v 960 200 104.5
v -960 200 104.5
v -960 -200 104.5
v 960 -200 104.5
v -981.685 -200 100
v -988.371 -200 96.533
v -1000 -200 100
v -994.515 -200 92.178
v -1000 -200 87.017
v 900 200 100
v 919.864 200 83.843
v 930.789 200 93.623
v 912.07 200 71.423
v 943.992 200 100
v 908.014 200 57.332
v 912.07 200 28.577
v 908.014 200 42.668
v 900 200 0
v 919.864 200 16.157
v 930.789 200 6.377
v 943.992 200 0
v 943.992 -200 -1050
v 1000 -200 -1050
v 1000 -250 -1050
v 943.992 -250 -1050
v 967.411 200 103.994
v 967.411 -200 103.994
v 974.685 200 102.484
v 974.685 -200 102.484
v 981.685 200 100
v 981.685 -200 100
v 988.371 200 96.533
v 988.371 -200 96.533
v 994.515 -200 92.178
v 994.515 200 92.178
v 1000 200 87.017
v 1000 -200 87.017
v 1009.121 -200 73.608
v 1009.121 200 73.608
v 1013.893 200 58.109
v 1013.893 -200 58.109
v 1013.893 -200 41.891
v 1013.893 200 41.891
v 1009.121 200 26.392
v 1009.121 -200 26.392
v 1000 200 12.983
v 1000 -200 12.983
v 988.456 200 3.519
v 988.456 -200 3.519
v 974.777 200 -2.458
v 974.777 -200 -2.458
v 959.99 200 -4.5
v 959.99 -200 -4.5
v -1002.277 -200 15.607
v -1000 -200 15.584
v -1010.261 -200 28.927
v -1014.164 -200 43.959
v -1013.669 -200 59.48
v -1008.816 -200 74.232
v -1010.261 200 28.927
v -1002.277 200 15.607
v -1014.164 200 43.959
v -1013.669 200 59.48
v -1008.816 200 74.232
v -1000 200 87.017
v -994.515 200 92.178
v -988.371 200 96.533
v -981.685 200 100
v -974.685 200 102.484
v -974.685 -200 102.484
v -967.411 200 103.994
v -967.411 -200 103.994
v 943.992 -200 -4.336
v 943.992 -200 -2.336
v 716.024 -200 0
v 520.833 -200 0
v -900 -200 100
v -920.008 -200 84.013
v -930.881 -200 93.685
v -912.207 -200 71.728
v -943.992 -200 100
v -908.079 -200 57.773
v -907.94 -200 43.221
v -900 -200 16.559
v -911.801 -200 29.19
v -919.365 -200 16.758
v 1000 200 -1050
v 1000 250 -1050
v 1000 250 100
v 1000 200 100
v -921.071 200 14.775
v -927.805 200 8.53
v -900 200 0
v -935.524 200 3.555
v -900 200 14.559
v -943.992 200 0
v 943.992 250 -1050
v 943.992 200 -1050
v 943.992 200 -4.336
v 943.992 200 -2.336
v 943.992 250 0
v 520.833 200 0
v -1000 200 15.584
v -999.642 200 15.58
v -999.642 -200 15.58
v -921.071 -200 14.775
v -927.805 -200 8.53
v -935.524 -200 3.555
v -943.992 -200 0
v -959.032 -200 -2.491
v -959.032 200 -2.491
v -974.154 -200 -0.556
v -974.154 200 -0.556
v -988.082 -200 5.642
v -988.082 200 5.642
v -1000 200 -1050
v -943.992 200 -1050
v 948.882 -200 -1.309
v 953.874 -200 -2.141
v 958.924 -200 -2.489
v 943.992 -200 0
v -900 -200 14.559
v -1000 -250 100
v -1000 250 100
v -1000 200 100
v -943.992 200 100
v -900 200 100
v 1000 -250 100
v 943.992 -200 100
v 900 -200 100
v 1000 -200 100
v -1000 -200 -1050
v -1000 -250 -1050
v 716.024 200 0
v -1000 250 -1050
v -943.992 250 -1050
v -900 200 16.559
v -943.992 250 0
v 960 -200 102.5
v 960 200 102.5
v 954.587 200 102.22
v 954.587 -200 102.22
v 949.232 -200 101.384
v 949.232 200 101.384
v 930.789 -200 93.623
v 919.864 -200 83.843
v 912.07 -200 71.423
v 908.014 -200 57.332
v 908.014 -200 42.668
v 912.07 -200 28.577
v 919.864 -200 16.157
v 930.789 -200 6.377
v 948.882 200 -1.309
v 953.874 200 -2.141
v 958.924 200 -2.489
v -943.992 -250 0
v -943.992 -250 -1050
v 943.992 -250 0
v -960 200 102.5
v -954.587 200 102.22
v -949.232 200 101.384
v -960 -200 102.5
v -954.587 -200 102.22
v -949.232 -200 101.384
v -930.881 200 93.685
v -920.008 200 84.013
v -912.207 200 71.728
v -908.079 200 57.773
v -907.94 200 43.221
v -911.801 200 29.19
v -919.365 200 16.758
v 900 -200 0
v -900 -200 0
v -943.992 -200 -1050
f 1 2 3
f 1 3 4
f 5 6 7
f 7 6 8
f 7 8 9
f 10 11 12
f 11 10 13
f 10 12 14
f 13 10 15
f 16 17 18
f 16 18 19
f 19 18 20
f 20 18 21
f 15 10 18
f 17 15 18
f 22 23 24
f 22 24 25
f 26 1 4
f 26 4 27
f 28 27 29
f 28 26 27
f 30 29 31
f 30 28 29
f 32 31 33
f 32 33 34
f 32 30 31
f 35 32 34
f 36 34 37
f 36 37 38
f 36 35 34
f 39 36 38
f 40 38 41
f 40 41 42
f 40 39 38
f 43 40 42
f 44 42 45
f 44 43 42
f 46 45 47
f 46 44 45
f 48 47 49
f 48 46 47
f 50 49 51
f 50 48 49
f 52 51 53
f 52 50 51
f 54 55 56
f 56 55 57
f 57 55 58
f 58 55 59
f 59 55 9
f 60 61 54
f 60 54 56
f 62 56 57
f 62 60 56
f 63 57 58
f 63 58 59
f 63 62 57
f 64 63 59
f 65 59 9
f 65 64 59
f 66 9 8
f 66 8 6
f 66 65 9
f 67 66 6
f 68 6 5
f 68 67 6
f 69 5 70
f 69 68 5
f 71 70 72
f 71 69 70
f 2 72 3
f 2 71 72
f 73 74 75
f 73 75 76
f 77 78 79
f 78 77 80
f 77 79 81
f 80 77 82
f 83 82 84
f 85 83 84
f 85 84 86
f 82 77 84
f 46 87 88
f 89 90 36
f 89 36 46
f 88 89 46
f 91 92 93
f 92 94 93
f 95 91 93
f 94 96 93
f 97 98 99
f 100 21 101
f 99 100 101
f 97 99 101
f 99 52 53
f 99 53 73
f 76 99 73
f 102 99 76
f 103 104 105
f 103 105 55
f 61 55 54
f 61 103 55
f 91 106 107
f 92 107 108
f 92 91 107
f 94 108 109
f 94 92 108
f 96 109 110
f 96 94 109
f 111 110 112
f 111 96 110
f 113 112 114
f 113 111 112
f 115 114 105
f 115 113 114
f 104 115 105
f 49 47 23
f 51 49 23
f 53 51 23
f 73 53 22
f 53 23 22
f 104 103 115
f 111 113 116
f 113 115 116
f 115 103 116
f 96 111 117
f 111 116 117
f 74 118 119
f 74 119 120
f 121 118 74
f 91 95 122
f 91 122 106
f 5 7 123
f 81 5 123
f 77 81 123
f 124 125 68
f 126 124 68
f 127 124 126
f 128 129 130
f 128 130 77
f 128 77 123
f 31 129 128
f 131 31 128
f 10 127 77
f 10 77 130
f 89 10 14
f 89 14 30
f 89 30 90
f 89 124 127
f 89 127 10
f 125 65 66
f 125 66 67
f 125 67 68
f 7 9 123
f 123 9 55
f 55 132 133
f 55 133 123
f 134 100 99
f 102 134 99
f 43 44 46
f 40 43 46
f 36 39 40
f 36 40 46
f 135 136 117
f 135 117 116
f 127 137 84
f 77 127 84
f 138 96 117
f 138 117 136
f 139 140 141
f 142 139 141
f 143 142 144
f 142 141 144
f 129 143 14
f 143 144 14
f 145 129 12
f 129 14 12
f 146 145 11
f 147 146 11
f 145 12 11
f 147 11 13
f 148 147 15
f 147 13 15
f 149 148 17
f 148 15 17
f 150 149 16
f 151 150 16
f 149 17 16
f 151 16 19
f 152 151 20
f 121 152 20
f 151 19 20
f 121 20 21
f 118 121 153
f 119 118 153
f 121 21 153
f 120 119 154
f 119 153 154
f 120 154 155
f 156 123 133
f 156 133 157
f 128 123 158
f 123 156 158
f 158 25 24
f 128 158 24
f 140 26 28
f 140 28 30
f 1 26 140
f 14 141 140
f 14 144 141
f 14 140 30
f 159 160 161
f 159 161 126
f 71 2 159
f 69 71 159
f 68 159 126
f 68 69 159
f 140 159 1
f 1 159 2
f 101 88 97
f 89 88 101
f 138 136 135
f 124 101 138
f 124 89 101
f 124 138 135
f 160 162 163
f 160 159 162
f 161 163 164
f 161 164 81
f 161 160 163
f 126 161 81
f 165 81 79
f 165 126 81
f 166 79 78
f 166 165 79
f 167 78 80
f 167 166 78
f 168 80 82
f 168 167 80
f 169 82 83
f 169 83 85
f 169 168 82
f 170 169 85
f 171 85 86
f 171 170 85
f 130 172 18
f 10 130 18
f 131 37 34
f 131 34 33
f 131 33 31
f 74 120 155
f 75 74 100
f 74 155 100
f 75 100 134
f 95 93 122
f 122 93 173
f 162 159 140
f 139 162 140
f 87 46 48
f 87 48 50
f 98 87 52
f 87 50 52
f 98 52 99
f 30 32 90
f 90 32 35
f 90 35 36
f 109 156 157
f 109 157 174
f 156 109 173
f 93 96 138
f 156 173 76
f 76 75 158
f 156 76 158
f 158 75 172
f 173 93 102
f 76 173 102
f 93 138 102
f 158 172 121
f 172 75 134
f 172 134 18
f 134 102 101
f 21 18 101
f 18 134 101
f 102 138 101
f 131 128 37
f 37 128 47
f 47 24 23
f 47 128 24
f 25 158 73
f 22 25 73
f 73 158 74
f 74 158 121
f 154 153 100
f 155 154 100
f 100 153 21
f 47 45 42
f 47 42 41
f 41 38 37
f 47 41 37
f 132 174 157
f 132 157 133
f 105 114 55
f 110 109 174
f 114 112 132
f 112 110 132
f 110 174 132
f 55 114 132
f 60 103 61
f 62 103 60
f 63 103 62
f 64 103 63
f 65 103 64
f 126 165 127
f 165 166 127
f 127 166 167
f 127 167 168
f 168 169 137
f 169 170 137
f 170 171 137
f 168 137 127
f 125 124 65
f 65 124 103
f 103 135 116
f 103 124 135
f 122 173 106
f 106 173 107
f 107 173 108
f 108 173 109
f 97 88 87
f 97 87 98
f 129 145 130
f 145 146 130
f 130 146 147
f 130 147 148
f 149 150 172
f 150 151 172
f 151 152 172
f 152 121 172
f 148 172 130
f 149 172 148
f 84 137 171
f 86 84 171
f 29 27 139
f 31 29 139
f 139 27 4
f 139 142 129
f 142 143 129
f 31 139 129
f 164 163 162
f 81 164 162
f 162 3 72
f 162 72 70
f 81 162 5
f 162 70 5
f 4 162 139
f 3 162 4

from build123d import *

# Parameters (mm, degrees)
BOSS_EXTRUDE1_DEPTH = 100
SKETCH2_R           = 52.5
BOSS_EXTRUDE2_DEPTH = 400
BOSS_EXTRUDE3_START = -400
BOSS_EXTRUDE3_DEPTH = 400
SKETCH4_W           = 56.007810594
SKETCH4_H           = 50
BOSS_EXTRUDE4_DEPTH = 1050


with BuildPart() as part:
    # Sketch1 → Boss-Extrude1 (new body)
    with BuildSketch(Plane.XY):
        Polygon((-1000, 200), (-900, 200), (-900, -200), (-1000, -200), (-1000, -250), (1000, -250), (1000, -200), (900, -200), (900, 200), (1000, 200), (1000, 250), (-1000, 250), align=None)
    extrude(amount=BOSS_EXTRUDE1_DEPTH)

    # Sketch2 → Boss-Extrude2 (add)
    with BuildSketch(Plane.XZ.offset(-200)):
        with Locations(Location((960, 50, 0), (0, 0, 107.752790162))):
            Circle(SKETCH2_R)
    boss_extrude2 = extrude(amount=BOSS_EXTRUDE2_DEPTH)

    # Mirror1: Boss-Extrude2 across plane
    add(boss_extrude2.mirror(Plane(origin=(0, 0, 0), x_dir=(0, 0, 1), z_dir=(1, 0, 0))))

    # Sketch3 → Boss-Extrude3 (add)
    with BuildSketch(Plane.XZ.offset(200).offset(BOSS_EXTRUDE3_START)):
        with BuildLine():
            Line((959.98965758, -4.499999019), (-1002.277476215, 15.607195449))
            ThreePointArc((-1002.277476215, 15.607195449), (-1009.217160869, 73.407714027), (-960, 104.5))
            Line((-960, 104.5), (960, 104.5))
            ThreePointArc((960, 104.5), (1014.499999755, 49.99482879), (959.98965758, -4.499999019))
        make_face()
        with BuildLine():
            Line((-960, 102.5), (960, 102.5))
            ThreePointArc((960, 102.5), (1012.5, 50), (960, -2.5))
            Line((960, -2.5), (-1001.307615203, 17.597362357))
            ThreePointArc((-1001.307615203, 17.597362357), (-1007.209048265, 72.96858206), (-960, 102.5))
        make_face(mode=Mode.SUBTRACT)
    extrude(amount=BOSS_EXTRUDE3_DEPTH)

    # Sketch4 → Boss-Extrude4 (add)
    with BuildSketch(Plane(origin=(0, 0, 0), x_dir=(-1, 0, 0), z_dir=(0, 0, -1))):
        with Locations((-971.996094703, 225)):
            Rectangle(SKETCH4_W, SKETCH4_H)
        with Locations((971.996094703, 225)):
            Rectangle(SKETCH4_W, SKETCH4_H)
        with Locations((971.996094703, -225)):
            Rectangle(SKETCH4_W, SKETCH4_H)
        with Locations((-971.996094703, -225)):
            Rectangle(SKETCH4_W, SKETCH4_H)
    extrude(amount=BOSS_EXTRUDE4_DEPTH)


solid = part.part
